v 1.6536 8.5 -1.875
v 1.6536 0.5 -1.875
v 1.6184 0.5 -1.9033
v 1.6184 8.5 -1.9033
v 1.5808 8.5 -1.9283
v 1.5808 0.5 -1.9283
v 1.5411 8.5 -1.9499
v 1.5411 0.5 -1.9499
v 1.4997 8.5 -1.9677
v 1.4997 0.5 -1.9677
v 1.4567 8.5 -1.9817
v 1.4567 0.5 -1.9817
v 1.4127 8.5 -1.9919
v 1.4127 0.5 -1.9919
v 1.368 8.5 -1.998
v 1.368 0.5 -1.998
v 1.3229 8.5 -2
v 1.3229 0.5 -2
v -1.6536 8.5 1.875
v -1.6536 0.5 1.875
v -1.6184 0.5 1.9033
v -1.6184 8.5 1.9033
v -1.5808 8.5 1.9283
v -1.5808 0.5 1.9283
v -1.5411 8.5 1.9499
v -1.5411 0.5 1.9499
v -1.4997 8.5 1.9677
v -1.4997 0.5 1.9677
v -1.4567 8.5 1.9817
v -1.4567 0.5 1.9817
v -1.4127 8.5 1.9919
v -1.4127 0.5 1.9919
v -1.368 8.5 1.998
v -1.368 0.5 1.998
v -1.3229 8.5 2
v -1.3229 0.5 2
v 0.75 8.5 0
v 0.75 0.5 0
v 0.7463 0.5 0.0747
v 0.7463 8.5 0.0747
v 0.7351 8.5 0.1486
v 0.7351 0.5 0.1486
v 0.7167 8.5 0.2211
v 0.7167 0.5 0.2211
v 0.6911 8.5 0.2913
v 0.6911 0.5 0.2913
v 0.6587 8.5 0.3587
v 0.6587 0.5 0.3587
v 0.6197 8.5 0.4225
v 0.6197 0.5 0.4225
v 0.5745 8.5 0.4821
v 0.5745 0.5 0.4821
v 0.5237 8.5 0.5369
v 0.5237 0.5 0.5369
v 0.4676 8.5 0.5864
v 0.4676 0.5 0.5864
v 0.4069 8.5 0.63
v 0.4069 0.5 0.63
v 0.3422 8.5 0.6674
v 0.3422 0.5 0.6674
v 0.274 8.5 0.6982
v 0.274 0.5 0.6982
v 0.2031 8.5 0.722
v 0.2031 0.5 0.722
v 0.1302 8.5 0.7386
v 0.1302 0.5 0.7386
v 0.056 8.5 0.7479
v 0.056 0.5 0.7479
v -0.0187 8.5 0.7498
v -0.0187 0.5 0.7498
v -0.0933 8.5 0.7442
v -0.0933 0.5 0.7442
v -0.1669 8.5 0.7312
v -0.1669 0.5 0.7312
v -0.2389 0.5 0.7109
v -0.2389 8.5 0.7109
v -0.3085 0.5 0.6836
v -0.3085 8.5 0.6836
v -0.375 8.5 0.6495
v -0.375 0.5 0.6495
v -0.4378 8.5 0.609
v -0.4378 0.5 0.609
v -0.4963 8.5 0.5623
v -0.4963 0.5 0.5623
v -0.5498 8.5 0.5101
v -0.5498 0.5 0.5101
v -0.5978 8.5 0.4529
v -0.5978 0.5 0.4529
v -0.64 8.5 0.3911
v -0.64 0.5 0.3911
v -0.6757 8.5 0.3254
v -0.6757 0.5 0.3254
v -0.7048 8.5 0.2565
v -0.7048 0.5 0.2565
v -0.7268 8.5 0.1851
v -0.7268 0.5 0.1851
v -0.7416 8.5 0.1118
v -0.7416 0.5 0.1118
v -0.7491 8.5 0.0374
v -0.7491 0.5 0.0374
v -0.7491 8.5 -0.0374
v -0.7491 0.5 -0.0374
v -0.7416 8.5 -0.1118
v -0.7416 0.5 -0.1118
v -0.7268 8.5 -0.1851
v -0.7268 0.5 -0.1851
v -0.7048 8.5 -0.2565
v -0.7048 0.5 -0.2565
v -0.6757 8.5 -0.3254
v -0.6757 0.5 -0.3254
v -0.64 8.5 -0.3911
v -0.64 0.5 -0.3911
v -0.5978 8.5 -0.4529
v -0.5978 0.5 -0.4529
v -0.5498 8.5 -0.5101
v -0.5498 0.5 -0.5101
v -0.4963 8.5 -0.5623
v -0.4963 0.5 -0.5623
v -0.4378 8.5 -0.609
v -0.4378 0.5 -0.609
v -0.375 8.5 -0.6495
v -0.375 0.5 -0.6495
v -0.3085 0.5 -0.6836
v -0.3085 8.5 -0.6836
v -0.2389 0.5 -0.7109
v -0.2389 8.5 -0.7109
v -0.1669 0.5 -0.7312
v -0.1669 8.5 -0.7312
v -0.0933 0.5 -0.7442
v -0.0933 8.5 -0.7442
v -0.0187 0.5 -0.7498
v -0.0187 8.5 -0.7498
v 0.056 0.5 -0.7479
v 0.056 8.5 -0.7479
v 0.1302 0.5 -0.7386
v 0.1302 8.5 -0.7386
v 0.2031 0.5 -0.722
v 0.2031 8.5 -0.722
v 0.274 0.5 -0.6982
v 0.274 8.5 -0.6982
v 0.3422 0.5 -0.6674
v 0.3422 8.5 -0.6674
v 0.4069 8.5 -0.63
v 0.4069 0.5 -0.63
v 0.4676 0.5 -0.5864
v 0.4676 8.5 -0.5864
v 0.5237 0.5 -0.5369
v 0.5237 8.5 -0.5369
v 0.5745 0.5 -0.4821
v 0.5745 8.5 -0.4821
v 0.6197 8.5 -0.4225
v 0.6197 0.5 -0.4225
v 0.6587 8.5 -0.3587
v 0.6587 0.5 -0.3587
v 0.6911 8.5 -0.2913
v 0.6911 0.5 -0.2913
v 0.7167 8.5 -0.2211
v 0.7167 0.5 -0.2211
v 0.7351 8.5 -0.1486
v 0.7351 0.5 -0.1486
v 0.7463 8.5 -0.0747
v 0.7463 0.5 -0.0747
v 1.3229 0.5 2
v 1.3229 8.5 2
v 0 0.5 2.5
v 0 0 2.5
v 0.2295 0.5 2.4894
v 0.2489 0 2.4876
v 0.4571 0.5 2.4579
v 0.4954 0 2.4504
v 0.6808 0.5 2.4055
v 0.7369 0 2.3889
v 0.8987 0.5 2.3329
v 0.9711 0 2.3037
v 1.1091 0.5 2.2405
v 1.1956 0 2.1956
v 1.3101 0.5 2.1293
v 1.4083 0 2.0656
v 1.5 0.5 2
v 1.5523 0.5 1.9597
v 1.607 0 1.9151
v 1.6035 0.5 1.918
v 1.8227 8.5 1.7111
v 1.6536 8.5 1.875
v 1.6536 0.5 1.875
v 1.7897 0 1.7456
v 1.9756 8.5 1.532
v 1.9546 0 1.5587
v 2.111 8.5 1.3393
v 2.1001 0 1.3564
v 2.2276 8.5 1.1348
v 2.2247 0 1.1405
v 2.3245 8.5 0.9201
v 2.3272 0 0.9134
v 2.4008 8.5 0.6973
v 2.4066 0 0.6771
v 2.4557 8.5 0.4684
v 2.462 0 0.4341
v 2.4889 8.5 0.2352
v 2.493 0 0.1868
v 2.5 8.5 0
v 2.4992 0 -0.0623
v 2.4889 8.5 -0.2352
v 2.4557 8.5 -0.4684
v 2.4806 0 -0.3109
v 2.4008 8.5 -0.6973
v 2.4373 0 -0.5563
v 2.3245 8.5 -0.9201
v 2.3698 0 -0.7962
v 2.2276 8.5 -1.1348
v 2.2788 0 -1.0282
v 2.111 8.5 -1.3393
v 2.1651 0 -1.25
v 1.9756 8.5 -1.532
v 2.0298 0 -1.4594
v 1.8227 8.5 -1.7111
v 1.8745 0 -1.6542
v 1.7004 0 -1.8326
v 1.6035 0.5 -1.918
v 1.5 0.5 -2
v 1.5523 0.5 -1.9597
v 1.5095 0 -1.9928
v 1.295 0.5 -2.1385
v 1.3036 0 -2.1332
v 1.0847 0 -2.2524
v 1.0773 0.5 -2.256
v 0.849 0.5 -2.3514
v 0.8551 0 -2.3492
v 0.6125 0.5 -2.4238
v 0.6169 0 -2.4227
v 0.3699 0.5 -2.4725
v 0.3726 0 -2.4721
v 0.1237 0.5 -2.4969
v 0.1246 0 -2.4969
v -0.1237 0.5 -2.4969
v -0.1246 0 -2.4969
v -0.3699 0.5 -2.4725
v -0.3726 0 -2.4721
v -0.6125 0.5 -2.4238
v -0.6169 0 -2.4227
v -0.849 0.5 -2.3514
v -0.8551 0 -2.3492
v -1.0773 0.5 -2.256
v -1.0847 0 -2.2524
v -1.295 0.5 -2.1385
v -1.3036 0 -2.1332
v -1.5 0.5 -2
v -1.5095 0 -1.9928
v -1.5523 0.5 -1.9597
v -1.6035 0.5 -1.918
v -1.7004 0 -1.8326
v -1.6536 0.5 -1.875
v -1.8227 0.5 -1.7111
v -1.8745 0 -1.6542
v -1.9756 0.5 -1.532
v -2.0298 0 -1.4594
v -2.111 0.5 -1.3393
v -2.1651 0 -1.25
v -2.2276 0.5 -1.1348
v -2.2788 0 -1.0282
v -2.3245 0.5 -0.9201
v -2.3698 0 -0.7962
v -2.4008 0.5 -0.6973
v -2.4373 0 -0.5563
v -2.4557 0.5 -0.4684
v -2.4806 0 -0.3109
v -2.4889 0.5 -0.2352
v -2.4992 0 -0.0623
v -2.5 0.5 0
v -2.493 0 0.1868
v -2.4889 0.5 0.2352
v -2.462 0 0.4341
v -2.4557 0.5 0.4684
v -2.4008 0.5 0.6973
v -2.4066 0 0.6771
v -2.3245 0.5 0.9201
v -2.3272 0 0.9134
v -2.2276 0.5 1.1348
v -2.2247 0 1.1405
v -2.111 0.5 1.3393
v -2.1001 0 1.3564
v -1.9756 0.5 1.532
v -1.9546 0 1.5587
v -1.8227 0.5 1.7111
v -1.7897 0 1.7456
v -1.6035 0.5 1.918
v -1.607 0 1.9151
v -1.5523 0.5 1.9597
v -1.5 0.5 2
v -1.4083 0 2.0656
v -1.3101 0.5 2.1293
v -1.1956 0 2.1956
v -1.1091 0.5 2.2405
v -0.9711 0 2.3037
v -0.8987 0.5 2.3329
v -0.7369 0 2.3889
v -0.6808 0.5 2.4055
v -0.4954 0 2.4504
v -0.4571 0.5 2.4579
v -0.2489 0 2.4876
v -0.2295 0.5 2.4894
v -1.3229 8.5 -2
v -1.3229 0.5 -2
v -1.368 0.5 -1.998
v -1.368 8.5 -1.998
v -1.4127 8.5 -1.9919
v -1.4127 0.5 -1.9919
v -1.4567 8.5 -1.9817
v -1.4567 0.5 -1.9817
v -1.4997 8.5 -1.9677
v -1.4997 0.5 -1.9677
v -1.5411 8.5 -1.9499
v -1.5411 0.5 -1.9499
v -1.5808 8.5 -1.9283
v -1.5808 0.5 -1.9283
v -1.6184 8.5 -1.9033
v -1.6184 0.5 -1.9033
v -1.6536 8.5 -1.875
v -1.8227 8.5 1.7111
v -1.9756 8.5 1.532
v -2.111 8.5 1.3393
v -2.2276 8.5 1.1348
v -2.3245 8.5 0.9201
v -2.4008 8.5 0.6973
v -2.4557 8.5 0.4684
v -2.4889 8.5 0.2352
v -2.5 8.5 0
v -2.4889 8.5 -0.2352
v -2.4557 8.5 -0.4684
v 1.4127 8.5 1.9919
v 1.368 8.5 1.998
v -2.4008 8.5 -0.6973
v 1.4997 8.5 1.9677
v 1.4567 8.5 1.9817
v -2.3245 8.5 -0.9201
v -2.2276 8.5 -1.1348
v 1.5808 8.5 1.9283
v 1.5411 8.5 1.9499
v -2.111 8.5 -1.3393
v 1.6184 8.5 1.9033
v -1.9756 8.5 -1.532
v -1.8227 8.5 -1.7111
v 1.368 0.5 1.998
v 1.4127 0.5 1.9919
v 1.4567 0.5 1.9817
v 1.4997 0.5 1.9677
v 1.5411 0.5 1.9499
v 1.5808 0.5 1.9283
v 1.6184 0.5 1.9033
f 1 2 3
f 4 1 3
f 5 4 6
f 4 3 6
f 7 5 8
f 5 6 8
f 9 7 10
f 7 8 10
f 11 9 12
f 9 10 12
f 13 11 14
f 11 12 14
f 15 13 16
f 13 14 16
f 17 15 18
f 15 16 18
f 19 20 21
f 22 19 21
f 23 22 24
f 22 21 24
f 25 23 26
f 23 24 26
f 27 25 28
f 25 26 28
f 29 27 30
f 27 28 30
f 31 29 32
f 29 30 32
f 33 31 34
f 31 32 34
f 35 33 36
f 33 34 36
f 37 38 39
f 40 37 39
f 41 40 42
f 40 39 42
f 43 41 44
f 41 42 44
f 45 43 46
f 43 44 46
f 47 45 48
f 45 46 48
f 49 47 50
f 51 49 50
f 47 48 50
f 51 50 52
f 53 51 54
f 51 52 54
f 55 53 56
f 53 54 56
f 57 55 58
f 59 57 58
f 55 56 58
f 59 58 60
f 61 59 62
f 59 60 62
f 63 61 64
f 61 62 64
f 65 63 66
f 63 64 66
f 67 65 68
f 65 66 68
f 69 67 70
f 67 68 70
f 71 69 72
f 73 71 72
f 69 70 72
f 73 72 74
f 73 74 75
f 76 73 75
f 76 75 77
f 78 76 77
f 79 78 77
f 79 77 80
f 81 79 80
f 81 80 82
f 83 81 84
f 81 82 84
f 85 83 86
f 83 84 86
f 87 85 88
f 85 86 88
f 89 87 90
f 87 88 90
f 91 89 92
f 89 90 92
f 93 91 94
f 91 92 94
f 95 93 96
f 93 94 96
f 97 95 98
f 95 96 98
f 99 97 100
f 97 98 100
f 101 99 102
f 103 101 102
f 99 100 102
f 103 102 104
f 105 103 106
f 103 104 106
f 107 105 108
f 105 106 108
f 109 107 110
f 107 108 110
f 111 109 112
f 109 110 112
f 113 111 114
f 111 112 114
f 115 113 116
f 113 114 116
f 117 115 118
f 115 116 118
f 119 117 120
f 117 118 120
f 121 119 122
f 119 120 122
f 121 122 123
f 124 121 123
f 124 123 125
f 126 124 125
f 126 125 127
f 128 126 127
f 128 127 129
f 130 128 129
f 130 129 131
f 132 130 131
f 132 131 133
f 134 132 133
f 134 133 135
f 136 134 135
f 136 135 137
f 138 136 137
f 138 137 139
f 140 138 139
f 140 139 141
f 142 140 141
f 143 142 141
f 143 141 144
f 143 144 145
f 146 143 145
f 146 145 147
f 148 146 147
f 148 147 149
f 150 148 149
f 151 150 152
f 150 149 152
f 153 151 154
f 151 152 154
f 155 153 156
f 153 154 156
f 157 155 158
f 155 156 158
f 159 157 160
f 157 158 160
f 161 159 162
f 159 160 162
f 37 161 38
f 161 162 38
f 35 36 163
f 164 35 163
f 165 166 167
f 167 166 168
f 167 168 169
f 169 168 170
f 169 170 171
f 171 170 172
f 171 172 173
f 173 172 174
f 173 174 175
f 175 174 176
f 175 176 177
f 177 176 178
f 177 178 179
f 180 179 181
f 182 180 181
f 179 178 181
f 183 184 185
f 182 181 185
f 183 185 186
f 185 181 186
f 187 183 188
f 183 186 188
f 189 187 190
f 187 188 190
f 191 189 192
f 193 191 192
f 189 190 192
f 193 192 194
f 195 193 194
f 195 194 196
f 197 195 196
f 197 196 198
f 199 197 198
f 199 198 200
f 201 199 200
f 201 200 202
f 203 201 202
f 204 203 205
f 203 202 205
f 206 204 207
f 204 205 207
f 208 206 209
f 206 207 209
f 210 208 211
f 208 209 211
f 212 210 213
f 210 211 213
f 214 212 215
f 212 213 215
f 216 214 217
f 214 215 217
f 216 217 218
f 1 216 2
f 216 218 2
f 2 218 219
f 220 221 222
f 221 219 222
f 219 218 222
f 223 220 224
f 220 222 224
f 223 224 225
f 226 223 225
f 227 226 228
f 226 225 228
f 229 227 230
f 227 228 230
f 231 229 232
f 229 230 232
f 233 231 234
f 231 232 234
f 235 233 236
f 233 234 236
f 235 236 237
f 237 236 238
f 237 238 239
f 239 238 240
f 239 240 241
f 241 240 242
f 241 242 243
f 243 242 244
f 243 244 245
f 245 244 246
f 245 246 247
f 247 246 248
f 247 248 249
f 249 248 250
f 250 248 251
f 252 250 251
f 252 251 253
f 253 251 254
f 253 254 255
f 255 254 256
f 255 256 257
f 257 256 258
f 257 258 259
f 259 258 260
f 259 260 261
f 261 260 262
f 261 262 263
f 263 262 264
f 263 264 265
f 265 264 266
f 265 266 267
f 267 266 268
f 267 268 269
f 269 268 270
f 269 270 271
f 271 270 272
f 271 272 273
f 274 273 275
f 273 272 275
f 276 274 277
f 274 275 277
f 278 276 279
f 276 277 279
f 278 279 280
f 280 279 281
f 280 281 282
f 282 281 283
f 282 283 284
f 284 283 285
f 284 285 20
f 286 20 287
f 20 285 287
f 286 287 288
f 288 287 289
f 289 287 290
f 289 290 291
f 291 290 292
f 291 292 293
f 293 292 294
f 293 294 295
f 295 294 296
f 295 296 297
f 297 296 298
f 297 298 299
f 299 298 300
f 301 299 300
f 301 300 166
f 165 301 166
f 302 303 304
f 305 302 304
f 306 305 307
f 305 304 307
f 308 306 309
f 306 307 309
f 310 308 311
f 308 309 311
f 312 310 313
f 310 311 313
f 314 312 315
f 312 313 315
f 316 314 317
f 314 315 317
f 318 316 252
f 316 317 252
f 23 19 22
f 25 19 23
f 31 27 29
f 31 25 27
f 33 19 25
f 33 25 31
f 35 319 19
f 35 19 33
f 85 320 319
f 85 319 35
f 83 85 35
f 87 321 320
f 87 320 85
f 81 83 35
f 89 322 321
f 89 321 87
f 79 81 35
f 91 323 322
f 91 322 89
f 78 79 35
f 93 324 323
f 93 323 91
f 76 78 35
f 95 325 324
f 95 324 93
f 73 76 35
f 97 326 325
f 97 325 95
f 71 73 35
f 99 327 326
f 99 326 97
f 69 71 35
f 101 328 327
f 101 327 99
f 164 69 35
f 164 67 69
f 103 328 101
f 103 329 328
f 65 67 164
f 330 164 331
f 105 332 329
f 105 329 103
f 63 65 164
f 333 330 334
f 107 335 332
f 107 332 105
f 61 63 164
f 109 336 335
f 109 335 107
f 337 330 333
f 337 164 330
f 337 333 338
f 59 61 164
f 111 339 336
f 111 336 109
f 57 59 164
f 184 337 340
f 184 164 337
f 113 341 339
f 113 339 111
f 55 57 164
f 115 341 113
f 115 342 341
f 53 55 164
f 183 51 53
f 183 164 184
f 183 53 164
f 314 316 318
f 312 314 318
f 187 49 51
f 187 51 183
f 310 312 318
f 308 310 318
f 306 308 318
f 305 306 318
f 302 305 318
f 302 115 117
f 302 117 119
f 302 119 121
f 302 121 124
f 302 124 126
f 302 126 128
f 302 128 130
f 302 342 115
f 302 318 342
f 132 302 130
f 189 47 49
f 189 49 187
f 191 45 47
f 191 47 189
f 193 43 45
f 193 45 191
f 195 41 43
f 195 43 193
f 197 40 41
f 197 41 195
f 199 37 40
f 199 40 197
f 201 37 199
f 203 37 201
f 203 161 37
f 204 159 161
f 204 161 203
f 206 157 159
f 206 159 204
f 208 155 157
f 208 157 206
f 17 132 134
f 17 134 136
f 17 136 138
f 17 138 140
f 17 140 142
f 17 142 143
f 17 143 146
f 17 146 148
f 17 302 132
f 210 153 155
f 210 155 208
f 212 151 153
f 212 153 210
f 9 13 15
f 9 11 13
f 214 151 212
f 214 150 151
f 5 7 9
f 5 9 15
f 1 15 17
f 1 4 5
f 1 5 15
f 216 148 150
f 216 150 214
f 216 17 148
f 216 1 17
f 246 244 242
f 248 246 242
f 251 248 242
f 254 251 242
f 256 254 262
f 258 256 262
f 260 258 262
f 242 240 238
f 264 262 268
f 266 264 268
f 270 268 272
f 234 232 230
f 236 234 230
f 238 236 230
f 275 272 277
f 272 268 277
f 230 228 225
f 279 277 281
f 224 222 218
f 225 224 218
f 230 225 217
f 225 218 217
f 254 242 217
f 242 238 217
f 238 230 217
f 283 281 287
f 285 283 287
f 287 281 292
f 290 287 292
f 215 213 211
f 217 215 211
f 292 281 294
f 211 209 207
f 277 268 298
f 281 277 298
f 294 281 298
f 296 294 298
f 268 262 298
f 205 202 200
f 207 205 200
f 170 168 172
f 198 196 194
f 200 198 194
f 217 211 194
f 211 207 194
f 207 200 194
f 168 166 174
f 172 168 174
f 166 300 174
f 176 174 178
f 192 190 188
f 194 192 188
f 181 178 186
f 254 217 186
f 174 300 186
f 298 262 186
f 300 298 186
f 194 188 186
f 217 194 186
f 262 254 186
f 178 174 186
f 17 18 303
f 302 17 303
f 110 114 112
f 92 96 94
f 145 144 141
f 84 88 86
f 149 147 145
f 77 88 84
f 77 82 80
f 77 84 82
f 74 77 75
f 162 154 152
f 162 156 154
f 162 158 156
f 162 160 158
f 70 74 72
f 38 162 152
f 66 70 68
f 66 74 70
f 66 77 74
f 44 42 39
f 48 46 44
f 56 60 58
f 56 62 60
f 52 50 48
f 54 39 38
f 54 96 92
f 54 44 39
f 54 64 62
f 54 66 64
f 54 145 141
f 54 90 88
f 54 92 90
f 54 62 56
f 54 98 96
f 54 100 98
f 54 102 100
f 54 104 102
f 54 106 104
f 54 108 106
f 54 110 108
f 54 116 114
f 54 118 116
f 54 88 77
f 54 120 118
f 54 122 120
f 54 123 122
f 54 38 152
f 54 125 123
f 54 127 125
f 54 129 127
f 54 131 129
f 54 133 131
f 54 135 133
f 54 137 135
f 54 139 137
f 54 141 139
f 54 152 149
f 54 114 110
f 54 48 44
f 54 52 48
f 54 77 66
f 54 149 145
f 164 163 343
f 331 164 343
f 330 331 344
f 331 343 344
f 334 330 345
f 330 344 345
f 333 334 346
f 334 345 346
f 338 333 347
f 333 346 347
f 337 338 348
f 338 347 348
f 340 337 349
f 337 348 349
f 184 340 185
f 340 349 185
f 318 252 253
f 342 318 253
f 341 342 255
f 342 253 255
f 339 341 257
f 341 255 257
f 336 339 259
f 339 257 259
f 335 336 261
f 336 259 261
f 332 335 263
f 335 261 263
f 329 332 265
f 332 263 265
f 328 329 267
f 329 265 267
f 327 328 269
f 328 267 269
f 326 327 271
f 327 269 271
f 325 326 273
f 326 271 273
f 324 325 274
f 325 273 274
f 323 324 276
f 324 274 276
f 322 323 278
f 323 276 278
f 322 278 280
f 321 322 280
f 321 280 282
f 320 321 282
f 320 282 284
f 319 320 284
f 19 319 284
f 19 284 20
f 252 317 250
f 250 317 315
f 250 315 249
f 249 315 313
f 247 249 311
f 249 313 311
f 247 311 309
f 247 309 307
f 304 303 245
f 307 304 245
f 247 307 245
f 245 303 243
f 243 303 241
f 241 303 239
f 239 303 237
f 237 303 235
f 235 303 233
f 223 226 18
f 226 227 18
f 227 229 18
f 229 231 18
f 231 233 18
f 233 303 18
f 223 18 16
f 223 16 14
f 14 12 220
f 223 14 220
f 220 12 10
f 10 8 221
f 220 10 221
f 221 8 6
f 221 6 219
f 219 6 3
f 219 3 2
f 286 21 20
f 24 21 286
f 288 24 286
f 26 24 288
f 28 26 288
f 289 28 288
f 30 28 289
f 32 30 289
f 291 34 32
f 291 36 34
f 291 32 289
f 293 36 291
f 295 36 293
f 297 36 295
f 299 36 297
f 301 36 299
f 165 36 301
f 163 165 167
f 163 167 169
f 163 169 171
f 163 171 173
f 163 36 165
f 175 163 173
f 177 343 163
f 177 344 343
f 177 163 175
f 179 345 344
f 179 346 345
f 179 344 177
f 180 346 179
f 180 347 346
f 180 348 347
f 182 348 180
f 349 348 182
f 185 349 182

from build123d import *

# Parameters (mm, degrees)
SKETCH2_R           = 2.5
BOSS_EXTRUDE1_DEPTH = 0.5
BOSS_EXTRUDE2_DEPTH = 8
FILLET1_R           = 0.5


with BuildPart() as part:
    # Sketch2 → Boss-Extrude1 (new body)
    with BuildSketch(Plane(origin=(0, 0, 0), x_dir=(1, 0, 0), z_dir=(0, 1, 0))):
        with Locations(Location((0, 0, 0), (0, 0, 270))):
            Circle(SKETCH2_R)
    extrude(amount=BOSS_EXTRUDE1_DEPTH)

    # Sketch3 → Boss-Extrude2 (add)
    with BuildSketch(Plane(origin=(0, 0.5, 0), x_dir=(1, 0, 0), z_dir=(0, 1, 0))):
        with BuildLine():
            Line((1.5, 2), (-1.5, 2))
            ThreePointArc((-1.5, 2), (-2.236067977, 1.118033989), (-2.5, 0))
            Line((-2.5, 0), (-0.75, 0))
            ThreePointArc((-0.75, 0), (0, 0.75), (0.75, 0))
            Line((0.75, 0), (2.5, 0))
            ThreePointArc((2.5, 0), (2.236067977, 1.118033989), (1.5, 2))
        make_face()
        with BuildLine():
            Line((-0.75, 0), (-2.5, 0))
            ThreePointArc((-2.5, 0), (-2.236067977, -1.118033989), (-1.5, -2))
            Line((-1.5, -2), (1.5, -2))
            ThreePointArc((1.5, -2), (2.236067977, -1.118033989), (2.5, 0))
            Line((2.5, 0), (0.75, 0))
            ThreePointArc((0.75, 0), (0, -0.75), (-0.75, 0))
        make_face()
    extrude(amount=BOSS_EXTRUDE2_DEPTH)

    # Fillet1
    # the kernel refuses this fillet: 0.5 mm, written as the material it takes off along each edge
    with BuildSketch(Plane(origin=(-1.5, 0.5, -2), x_dir=(-0.7756085685899518, 0, 0.6312141857799506), z_dir=(0, 1, 0)), Plane(origin=(1.5, 0.5, 2), x_dir=(0.7756085685899534, 0, -0.6312141857799487), z_dir=(0, 1, 0))) as fillet1_piece_1:
        with BuildLine():
            CenterArc((0.178227934, 0.499607683), FILLET1_R, 230.860240122, 41.409622109)
            Line((-0.137379159, 0.111803399), (0, 0))
            ThreePointArc((0, 0), (0.099015519, -0.001961584), (0.198031037, 0))
        make_face()
    extrude(amount=8.495077593, mode=Mode.SUBTRACT)
    with BuildSketch(Plane(origin=(1.5, 0.5, -2), x_dir=(0.7756085685899526, 0, 0.6312141857799497), z_dir=(0, 1, 0)), Plane(origin=(-1.5, 0.5, 2), x_dir=(-0.7756085685899534, 0, -0.6312141857799487), z_dir=(0, 1, 0))) as fillet1_piece_2:
        with BuildLine():
            CenterArc((0.178227934, -0.499607683), FILLET1_R, 87.730137768, 41.409622109)
            Line((-0.137379159, -0.111803399), (0, 0))
            ThreePointArc((0, 0), (0.099015519, 0.001961584), (0.198031037, 0))
        make_face()
    extrude(amount=8.495077593, mode=Mode.SUBTRACT)


solid = part.part
